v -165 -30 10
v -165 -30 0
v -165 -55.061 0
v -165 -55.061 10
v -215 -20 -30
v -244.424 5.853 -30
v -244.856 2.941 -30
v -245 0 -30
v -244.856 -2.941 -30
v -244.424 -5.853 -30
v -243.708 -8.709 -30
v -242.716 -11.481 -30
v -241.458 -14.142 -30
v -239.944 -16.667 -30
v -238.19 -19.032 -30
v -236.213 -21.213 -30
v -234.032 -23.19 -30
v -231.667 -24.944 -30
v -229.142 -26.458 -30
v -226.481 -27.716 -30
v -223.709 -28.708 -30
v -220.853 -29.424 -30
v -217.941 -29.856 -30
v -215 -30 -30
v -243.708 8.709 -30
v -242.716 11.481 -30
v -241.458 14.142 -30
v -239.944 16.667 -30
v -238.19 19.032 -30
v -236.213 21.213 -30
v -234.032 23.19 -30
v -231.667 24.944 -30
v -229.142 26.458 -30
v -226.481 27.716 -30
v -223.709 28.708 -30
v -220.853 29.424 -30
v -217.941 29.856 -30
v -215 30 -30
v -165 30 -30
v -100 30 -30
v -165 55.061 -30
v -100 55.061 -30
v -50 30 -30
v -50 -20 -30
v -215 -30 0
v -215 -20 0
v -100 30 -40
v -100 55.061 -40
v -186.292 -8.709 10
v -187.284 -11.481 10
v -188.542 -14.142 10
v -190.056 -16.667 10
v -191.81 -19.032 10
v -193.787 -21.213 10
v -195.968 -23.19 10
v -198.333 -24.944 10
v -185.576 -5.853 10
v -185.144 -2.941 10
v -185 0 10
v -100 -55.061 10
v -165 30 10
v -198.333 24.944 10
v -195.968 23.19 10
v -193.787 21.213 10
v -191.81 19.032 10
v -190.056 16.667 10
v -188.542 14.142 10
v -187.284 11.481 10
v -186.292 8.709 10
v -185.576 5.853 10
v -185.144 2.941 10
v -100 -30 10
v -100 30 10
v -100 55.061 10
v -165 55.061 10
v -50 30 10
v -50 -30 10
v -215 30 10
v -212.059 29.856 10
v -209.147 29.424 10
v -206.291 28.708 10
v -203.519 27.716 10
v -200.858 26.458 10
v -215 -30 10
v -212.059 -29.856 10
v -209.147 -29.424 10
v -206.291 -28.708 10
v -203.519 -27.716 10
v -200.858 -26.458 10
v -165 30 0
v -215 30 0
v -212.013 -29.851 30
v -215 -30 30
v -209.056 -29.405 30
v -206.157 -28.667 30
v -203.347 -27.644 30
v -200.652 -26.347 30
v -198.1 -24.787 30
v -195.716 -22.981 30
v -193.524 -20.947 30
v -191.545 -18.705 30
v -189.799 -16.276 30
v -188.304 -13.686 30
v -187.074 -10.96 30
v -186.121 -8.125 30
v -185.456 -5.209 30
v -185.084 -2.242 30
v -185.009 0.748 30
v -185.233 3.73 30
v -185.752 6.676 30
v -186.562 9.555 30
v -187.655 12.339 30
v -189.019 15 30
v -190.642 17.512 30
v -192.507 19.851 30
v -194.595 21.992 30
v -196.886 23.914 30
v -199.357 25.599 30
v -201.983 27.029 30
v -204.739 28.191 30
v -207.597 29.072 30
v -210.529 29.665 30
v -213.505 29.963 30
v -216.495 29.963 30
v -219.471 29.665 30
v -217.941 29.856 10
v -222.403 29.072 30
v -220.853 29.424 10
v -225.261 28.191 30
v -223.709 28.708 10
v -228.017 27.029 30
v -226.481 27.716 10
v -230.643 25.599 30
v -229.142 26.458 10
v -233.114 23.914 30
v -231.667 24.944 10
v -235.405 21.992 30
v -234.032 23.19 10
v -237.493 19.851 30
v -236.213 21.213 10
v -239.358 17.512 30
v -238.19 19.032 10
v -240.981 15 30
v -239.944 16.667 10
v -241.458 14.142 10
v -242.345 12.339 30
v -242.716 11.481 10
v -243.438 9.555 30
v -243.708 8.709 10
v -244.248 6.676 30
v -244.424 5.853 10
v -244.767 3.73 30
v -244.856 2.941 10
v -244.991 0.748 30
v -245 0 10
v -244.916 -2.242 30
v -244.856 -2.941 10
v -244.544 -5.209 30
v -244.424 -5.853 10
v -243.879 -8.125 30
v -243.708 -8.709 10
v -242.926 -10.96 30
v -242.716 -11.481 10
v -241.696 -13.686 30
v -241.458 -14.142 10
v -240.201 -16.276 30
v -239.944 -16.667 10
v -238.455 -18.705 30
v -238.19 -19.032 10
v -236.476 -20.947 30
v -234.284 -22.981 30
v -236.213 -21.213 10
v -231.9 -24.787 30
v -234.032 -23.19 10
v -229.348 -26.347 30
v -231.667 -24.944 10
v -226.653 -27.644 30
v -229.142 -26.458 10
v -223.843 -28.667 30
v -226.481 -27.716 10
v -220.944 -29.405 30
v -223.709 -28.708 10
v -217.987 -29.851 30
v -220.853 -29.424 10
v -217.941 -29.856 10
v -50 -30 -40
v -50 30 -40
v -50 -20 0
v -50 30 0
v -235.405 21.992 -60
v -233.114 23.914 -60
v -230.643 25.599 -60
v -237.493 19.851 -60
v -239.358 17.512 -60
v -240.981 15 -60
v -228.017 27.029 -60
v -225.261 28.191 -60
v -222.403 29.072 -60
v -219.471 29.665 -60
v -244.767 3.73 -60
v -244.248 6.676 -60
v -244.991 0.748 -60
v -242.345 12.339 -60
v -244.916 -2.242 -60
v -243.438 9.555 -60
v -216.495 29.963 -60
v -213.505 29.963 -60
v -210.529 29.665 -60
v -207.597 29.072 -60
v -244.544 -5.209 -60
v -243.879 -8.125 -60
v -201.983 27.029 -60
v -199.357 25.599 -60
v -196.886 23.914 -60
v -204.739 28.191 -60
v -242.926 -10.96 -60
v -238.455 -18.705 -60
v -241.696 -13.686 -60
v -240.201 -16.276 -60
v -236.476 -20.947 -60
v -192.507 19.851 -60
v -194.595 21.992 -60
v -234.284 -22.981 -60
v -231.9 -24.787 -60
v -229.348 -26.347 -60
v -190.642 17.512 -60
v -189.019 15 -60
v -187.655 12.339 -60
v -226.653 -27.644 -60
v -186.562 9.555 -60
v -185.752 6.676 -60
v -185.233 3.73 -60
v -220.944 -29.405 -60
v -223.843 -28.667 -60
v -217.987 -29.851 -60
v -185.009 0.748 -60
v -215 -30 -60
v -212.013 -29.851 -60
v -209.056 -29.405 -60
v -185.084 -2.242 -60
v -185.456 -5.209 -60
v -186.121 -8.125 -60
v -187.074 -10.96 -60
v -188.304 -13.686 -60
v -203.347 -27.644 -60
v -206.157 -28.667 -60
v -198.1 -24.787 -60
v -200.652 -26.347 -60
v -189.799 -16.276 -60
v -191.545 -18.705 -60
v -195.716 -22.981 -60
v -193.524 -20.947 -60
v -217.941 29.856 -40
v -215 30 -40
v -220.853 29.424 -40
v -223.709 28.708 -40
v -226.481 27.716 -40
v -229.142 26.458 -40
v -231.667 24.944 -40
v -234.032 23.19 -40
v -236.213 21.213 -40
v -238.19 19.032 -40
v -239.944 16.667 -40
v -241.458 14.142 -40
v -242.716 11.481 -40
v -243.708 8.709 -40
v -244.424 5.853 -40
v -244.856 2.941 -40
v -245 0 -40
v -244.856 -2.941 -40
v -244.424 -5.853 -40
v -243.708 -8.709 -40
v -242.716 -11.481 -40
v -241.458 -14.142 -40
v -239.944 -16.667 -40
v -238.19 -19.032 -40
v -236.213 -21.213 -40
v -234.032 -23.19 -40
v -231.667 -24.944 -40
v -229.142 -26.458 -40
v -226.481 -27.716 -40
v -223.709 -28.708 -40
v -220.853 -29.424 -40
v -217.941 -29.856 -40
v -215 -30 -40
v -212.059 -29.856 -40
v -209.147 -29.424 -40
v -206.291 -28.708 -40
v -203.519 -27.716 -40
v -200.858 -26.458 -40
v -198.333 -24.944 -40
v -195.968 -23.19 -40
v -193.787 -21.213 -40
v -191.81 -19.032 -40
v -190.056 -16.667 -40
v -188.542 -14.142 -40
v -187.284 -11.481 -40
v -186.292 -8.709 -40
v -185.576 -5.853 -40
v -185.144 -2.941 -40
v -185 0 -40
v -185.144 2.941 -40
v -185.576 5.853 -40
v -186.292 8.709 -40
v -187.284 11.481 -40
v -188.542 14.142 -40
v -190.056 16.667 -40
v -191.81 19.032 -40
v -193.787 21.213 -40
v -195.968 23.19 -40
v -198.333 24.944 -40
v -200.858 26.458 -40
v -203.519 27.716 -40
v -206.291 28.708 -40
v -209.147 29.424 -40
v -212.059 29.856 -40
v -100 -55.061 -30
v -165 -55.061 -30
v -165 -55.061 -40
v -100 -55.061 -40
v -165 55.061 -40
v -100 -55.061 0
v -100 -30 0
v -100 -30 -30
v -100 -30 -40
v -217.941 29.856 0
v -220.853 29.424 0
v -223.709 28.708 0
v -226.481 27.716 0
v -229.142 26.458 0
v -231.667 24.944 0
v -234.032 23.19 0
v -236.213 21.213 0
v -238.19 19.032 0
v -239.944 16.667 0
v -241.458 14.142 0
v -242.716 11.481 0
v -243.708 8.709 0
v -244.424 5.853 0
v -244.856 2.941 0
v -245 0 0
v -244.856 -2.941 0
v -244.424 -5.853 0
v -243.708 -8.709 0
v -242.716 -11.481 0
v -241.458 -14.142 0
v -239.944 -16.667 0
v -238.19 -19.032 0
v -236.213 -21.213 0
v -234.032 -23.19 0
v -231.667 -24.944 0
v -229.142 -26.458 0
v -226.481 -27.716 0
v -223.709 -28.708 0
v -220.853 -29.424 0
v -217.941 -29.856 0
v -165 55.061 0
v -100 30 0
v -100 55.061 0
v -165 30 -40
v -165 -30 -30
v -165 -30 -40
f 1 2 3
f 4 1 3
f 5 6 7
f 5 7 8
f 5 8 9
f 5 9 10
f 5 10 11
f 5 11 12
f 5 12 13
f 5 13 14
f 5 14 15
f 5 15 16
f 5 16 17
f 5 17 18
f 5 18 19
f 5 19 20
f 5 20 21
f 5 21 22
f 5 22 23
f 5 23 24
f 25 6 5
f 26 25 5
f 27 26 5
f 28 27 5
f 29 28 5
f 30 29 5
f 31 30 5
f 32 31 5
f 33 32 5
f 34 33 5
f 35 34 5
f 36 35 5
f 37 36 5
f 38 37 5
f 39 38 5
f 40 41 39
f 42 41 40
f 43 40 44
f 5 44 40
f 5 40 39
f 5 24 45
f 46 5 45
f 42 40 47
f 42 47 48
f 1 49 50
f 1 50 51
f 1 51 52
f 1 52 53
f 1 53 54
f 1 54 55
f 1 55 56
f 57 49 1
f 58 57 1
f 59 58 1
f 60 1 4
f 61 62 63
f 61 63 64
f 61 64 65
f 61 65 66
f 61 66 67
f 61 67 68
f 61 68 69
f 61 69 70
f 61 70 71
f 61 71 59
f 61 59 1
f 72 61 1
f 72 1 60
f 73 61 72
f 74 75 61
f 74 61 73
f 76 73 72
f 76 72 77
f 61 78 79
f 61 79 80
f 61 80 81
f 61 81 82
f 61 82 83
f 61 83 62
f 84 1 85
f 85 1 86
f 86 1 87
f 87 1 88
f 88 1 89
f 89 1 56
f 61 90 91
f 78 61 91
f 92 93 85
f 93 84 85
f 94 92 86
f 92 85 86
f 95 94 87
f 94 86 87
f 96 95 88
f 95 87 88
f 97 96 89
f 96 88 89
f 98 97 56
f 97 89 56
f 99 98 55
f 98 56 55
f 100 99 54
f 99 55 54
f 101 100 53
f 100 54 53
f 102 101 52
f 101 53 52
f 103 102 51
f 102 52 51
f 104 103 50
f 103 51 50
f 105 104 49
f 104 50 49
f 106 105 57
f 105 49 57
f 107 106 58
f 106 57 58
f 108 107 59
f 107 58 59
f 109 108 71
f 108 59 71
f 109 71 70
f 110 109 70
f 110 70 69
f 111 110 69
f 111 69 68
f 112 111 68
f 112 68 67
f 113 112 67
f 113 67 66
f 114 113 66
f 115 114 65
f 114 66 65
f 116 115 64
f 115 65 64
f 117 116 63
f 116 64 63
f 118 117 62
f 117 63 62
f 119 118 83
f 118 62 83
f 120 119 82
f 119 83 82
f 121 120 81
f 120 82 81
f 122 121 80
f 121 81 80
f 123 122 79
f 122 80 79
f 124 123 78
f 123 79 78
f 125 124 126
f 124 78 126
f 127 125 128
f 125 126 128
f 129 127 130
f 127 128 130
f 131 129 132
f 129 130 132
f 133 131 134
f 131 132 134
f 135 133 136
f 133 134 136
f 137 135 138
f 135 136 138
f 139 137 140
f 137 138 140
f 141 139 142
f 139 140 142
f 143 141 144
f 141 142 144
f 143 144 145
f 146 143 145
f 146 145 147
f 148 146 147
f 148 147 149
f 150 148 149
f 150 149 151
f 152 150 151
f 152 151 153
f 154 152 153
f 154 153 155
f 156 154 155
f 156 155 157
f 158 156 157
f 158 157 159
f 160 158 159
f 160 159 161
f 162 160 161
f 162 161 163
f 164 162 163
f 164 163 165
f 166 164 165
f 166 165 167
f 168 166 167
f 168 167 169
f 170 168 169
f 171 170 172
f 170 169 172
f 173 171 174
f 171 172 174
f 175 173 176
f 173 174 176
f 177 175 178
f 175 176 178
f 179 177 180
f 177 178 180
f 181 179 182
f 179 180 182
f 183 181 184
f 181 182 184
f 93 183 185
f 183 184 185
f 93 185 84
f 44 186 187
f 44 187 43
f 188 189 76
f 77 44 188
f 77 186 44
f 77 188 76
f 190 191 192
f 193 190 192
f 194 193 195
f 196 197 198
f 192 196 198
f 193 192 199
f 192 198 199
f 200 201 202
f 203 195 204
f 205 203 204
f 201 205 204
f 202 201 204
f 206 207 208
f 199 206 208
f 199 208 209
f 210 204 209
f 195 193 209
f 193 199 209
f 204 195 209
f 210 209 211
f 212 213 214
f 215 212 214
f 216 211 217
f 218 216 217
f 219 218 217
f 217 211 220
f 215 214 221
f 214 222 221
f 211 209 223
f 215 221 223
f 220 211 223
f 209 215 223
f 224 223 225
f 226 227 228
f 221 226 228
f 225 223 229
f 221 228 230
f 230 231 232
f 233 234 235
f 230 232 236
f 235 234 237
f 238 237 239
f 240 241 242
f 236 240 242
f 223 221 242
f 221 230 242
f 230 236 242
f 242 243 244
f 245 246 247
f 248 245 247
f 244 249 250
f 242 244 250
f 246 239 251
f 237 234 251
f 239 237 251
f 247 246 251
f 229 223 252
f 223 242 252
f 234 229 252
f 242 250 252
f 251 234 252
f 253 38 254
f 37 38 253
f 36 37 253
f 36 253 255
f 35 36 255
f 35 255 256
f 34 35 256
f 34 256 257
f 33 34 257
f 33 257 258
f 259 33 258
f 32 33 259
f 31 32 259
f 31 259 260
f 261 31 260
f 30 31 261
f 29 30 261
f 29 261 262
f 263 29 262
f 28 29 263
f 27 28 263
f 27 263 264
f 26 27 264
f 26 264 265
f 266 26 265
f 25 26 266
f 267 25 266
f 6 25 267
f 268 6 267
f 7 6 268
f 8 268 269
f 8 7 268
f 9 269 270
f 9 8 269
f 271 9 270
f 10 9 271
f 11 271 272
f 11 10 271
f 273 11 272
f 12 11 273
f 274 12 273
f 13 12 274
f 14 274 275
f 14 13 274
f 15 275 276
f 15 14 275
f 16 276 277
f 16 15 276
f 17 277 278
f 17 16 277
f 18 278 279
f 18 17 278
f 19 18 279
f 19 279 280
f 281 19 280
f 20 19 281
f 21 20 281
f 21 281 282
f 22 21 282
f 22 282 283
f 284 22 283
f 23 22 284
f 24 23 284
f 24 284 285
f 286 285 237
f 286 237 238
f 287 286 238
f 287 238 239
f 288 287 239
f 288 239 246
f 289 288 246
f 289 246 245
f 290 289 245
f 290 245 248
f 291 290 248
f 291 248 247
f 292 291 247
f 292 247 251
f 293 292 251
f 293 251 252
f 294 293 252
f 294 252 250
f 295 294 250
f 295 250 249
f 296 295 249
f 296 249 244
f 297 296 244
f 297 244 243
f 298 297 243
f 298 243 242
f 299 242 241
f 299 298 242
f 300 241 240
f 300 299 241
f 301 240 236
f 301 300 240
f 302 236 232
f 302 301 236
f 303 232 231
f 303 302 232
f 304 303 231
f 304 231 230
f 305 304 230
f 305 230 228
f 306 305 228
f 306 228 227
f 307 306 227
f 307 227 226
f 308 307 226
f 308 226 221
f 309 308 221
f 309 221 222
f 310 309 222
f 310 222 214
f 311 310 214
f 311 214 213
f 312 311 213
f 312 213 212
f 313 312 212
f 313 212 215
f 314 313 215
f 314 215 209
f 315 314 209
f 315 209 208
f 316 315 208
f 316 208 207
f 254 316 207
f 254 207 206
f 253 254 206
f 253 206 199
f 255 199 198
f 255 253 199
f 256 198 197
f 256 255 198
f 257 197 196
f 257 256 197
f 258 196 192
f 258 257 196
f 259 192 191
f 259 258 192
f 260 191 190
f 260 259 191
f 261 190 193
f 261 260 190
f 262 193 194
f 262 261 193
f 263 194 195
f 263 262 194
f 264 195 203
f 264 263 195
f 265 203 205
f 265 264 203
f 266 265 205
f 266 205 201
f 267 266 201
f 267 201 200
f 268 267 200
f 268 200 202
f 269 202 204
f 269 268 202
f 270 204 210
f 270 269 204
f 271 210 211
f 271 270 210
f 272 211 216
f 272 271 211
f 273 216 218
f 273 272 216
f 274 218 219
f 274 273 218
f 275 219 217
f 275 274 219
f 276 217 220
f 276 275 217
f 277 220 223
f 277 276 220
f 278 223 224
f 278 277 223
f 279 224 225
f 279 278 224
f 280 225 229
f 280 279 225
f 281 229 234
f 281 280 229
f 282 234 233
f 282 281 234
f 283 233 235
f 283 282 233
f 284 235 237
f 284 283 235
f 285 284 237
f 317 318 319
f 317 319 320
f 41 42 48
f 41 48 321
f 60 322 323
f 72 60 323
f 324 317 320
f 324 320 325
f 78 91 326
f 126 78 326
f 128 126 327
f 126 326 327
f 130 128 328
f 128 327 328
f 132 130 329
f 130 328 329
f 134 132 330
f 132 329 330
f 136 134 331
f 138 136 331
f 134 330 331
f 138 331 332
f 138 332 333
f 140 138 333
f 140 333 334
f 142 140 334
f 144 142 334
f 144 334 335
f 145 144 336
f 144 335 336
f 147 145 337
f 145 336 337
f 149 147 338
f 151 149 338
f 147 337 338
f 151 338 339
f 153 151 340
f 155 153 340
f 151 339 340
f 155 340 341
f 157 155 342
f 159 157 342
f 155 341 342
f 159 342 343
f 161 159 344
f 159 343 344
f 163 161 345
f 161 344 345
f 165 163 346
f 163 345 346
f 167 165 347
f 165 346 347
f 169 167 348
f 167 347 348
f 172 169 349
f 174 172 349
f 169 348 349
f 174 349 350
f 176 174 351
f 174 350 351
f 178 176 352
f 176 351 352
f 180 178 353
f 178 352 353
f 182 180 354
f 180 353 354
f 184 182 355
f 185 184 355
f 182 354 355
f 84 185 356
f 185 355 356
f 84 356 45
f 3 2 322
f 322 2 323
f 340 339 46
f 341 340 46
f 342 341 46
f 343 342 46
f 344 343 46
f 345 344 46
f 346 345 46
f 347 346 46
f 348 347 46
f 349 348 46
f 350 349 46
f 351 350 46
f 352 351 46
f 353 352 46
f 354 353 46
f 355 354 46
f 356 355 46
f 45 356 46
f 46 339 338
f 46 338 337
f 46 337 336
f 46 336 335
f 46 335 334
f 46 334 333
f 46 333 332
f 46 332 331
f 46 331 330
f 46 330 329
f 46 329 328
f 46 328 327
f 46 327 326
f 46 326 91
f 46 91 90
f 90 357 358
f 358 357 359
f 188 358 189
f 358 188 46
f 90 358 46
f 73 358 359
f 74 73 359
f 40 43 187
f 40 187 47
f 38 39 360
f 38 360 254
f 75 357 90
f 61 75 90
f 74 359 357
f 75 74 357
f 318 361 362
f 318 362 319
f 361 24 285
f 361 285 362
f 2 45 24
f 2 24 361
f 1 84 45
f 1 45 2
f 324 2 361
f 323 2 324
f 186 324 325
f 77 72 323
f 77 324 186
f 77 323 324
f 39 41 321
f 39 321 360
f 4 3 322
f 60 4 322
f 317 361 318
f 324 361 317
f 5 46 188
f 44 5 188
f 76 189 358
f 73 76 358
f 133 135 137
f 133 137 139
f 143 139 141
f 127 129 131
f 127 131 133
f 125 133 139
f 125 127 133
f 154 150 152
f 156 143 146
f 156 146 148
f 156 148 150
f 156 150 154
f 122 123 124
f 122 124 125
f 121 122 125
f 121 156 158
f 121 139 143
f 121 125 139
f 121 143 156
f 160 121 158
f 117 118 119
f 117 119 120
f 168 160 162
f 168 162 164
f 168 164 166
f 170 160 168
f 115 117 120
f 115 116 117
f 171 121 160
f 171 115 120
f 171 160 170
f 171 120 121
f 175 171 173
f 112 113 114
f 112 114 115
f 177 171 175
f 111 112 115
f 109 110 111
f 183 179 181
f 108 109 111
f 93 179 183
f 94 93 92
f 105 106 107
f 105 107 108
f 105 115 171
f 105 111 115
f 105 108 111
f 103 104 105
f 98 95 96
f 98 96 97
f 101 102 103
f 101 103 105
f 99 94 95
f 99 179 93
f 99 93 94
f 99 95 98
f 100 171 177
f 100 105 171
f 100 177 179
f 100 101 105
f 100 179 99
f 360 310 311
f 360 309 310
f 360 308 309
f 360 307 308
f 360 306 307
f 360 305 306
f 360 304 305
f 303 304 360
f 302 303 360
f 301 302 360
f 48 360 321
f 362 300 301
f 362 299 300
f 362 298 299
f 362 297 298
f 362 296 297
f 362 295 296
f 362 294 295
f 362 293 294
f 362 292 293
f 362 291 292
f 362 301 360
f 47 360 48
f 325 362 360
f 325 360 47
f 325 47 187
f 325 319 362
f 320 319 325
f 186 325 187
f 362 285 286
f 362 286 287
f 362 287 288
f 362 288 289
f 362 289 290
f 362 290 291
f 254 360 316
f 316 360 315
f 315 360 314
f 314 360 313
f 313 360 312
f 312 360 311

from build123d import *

# Parameters (mm, degrees)
BOSS_EXTRUDE1_DEPTH = 10
SKETCH2_R           = 30
BOSS_EXTRUDE2_DEPTH = 20
SKETCH3_W           = 165
SKETCH3_H           = 50
BOSS_EXTRUDE3_DEPTH = 10


with BuildPart() as part:
    # Sketch1 → Boss-Extrude1 (new body)
    with BuildSketch(Plane.XY):
        with BuildLine():
            Line((-165, 30), (-215, 30))
            ThreePointArc((-215, 30), (-245, 0), (-215, -30))
            Line((-215, -30), (-165, -30))
            Line((-165, -30), (-165, -55.06097561))
            Line((-165, -55.06097561), (-100, -55.06097561))
            Line((-100, -55.06097561), (-100, -30))
            Line((-100, -30), (-50, -30))
            Line((-50, -30), (-50, 30))
            Line((-50, 30), (-100, 30))
            Line((-100, 30), (-100, 55.06097561))
            Line((-100, 55.06097561), (-165, 55.06097561))
            Line((-165, 55.06097561), (-165, 30))
        make_face()
    boss_extrude1 = extrude(amount=BOSS_EXTRUDE1_DEPTH)

    # Sketch2 → Boss-Extrude2 (add)
    with BuildSketch(Plane.XY.offset(10)):
        with Locations((-215, 0)):
            Circle(SKETCH2_R)
    boss_extrude2 = extrude(amount=BOSS_EXTRUDE2_DEPTH)

    # Sketch3 → Boss-Extrude3 (add)
    with BuildSketch(Plane.XZ.offset(30)):
        with Locations((-132.5, -15)):
            Rectangle(SKETCH3_W, SKETCH3_H)
    extrude(amount=-BOSS_EXTRUDE3_DEPTH)

    # Mirror1: Boss-Extrude1, Boss-Extrude2 across plane
    add(boss_extrude1.mirror(Plane.XY.offset(-15)))
    add(boss_extrude2.mirror(Plane.XY.offset(-15)))


solid = part.part
